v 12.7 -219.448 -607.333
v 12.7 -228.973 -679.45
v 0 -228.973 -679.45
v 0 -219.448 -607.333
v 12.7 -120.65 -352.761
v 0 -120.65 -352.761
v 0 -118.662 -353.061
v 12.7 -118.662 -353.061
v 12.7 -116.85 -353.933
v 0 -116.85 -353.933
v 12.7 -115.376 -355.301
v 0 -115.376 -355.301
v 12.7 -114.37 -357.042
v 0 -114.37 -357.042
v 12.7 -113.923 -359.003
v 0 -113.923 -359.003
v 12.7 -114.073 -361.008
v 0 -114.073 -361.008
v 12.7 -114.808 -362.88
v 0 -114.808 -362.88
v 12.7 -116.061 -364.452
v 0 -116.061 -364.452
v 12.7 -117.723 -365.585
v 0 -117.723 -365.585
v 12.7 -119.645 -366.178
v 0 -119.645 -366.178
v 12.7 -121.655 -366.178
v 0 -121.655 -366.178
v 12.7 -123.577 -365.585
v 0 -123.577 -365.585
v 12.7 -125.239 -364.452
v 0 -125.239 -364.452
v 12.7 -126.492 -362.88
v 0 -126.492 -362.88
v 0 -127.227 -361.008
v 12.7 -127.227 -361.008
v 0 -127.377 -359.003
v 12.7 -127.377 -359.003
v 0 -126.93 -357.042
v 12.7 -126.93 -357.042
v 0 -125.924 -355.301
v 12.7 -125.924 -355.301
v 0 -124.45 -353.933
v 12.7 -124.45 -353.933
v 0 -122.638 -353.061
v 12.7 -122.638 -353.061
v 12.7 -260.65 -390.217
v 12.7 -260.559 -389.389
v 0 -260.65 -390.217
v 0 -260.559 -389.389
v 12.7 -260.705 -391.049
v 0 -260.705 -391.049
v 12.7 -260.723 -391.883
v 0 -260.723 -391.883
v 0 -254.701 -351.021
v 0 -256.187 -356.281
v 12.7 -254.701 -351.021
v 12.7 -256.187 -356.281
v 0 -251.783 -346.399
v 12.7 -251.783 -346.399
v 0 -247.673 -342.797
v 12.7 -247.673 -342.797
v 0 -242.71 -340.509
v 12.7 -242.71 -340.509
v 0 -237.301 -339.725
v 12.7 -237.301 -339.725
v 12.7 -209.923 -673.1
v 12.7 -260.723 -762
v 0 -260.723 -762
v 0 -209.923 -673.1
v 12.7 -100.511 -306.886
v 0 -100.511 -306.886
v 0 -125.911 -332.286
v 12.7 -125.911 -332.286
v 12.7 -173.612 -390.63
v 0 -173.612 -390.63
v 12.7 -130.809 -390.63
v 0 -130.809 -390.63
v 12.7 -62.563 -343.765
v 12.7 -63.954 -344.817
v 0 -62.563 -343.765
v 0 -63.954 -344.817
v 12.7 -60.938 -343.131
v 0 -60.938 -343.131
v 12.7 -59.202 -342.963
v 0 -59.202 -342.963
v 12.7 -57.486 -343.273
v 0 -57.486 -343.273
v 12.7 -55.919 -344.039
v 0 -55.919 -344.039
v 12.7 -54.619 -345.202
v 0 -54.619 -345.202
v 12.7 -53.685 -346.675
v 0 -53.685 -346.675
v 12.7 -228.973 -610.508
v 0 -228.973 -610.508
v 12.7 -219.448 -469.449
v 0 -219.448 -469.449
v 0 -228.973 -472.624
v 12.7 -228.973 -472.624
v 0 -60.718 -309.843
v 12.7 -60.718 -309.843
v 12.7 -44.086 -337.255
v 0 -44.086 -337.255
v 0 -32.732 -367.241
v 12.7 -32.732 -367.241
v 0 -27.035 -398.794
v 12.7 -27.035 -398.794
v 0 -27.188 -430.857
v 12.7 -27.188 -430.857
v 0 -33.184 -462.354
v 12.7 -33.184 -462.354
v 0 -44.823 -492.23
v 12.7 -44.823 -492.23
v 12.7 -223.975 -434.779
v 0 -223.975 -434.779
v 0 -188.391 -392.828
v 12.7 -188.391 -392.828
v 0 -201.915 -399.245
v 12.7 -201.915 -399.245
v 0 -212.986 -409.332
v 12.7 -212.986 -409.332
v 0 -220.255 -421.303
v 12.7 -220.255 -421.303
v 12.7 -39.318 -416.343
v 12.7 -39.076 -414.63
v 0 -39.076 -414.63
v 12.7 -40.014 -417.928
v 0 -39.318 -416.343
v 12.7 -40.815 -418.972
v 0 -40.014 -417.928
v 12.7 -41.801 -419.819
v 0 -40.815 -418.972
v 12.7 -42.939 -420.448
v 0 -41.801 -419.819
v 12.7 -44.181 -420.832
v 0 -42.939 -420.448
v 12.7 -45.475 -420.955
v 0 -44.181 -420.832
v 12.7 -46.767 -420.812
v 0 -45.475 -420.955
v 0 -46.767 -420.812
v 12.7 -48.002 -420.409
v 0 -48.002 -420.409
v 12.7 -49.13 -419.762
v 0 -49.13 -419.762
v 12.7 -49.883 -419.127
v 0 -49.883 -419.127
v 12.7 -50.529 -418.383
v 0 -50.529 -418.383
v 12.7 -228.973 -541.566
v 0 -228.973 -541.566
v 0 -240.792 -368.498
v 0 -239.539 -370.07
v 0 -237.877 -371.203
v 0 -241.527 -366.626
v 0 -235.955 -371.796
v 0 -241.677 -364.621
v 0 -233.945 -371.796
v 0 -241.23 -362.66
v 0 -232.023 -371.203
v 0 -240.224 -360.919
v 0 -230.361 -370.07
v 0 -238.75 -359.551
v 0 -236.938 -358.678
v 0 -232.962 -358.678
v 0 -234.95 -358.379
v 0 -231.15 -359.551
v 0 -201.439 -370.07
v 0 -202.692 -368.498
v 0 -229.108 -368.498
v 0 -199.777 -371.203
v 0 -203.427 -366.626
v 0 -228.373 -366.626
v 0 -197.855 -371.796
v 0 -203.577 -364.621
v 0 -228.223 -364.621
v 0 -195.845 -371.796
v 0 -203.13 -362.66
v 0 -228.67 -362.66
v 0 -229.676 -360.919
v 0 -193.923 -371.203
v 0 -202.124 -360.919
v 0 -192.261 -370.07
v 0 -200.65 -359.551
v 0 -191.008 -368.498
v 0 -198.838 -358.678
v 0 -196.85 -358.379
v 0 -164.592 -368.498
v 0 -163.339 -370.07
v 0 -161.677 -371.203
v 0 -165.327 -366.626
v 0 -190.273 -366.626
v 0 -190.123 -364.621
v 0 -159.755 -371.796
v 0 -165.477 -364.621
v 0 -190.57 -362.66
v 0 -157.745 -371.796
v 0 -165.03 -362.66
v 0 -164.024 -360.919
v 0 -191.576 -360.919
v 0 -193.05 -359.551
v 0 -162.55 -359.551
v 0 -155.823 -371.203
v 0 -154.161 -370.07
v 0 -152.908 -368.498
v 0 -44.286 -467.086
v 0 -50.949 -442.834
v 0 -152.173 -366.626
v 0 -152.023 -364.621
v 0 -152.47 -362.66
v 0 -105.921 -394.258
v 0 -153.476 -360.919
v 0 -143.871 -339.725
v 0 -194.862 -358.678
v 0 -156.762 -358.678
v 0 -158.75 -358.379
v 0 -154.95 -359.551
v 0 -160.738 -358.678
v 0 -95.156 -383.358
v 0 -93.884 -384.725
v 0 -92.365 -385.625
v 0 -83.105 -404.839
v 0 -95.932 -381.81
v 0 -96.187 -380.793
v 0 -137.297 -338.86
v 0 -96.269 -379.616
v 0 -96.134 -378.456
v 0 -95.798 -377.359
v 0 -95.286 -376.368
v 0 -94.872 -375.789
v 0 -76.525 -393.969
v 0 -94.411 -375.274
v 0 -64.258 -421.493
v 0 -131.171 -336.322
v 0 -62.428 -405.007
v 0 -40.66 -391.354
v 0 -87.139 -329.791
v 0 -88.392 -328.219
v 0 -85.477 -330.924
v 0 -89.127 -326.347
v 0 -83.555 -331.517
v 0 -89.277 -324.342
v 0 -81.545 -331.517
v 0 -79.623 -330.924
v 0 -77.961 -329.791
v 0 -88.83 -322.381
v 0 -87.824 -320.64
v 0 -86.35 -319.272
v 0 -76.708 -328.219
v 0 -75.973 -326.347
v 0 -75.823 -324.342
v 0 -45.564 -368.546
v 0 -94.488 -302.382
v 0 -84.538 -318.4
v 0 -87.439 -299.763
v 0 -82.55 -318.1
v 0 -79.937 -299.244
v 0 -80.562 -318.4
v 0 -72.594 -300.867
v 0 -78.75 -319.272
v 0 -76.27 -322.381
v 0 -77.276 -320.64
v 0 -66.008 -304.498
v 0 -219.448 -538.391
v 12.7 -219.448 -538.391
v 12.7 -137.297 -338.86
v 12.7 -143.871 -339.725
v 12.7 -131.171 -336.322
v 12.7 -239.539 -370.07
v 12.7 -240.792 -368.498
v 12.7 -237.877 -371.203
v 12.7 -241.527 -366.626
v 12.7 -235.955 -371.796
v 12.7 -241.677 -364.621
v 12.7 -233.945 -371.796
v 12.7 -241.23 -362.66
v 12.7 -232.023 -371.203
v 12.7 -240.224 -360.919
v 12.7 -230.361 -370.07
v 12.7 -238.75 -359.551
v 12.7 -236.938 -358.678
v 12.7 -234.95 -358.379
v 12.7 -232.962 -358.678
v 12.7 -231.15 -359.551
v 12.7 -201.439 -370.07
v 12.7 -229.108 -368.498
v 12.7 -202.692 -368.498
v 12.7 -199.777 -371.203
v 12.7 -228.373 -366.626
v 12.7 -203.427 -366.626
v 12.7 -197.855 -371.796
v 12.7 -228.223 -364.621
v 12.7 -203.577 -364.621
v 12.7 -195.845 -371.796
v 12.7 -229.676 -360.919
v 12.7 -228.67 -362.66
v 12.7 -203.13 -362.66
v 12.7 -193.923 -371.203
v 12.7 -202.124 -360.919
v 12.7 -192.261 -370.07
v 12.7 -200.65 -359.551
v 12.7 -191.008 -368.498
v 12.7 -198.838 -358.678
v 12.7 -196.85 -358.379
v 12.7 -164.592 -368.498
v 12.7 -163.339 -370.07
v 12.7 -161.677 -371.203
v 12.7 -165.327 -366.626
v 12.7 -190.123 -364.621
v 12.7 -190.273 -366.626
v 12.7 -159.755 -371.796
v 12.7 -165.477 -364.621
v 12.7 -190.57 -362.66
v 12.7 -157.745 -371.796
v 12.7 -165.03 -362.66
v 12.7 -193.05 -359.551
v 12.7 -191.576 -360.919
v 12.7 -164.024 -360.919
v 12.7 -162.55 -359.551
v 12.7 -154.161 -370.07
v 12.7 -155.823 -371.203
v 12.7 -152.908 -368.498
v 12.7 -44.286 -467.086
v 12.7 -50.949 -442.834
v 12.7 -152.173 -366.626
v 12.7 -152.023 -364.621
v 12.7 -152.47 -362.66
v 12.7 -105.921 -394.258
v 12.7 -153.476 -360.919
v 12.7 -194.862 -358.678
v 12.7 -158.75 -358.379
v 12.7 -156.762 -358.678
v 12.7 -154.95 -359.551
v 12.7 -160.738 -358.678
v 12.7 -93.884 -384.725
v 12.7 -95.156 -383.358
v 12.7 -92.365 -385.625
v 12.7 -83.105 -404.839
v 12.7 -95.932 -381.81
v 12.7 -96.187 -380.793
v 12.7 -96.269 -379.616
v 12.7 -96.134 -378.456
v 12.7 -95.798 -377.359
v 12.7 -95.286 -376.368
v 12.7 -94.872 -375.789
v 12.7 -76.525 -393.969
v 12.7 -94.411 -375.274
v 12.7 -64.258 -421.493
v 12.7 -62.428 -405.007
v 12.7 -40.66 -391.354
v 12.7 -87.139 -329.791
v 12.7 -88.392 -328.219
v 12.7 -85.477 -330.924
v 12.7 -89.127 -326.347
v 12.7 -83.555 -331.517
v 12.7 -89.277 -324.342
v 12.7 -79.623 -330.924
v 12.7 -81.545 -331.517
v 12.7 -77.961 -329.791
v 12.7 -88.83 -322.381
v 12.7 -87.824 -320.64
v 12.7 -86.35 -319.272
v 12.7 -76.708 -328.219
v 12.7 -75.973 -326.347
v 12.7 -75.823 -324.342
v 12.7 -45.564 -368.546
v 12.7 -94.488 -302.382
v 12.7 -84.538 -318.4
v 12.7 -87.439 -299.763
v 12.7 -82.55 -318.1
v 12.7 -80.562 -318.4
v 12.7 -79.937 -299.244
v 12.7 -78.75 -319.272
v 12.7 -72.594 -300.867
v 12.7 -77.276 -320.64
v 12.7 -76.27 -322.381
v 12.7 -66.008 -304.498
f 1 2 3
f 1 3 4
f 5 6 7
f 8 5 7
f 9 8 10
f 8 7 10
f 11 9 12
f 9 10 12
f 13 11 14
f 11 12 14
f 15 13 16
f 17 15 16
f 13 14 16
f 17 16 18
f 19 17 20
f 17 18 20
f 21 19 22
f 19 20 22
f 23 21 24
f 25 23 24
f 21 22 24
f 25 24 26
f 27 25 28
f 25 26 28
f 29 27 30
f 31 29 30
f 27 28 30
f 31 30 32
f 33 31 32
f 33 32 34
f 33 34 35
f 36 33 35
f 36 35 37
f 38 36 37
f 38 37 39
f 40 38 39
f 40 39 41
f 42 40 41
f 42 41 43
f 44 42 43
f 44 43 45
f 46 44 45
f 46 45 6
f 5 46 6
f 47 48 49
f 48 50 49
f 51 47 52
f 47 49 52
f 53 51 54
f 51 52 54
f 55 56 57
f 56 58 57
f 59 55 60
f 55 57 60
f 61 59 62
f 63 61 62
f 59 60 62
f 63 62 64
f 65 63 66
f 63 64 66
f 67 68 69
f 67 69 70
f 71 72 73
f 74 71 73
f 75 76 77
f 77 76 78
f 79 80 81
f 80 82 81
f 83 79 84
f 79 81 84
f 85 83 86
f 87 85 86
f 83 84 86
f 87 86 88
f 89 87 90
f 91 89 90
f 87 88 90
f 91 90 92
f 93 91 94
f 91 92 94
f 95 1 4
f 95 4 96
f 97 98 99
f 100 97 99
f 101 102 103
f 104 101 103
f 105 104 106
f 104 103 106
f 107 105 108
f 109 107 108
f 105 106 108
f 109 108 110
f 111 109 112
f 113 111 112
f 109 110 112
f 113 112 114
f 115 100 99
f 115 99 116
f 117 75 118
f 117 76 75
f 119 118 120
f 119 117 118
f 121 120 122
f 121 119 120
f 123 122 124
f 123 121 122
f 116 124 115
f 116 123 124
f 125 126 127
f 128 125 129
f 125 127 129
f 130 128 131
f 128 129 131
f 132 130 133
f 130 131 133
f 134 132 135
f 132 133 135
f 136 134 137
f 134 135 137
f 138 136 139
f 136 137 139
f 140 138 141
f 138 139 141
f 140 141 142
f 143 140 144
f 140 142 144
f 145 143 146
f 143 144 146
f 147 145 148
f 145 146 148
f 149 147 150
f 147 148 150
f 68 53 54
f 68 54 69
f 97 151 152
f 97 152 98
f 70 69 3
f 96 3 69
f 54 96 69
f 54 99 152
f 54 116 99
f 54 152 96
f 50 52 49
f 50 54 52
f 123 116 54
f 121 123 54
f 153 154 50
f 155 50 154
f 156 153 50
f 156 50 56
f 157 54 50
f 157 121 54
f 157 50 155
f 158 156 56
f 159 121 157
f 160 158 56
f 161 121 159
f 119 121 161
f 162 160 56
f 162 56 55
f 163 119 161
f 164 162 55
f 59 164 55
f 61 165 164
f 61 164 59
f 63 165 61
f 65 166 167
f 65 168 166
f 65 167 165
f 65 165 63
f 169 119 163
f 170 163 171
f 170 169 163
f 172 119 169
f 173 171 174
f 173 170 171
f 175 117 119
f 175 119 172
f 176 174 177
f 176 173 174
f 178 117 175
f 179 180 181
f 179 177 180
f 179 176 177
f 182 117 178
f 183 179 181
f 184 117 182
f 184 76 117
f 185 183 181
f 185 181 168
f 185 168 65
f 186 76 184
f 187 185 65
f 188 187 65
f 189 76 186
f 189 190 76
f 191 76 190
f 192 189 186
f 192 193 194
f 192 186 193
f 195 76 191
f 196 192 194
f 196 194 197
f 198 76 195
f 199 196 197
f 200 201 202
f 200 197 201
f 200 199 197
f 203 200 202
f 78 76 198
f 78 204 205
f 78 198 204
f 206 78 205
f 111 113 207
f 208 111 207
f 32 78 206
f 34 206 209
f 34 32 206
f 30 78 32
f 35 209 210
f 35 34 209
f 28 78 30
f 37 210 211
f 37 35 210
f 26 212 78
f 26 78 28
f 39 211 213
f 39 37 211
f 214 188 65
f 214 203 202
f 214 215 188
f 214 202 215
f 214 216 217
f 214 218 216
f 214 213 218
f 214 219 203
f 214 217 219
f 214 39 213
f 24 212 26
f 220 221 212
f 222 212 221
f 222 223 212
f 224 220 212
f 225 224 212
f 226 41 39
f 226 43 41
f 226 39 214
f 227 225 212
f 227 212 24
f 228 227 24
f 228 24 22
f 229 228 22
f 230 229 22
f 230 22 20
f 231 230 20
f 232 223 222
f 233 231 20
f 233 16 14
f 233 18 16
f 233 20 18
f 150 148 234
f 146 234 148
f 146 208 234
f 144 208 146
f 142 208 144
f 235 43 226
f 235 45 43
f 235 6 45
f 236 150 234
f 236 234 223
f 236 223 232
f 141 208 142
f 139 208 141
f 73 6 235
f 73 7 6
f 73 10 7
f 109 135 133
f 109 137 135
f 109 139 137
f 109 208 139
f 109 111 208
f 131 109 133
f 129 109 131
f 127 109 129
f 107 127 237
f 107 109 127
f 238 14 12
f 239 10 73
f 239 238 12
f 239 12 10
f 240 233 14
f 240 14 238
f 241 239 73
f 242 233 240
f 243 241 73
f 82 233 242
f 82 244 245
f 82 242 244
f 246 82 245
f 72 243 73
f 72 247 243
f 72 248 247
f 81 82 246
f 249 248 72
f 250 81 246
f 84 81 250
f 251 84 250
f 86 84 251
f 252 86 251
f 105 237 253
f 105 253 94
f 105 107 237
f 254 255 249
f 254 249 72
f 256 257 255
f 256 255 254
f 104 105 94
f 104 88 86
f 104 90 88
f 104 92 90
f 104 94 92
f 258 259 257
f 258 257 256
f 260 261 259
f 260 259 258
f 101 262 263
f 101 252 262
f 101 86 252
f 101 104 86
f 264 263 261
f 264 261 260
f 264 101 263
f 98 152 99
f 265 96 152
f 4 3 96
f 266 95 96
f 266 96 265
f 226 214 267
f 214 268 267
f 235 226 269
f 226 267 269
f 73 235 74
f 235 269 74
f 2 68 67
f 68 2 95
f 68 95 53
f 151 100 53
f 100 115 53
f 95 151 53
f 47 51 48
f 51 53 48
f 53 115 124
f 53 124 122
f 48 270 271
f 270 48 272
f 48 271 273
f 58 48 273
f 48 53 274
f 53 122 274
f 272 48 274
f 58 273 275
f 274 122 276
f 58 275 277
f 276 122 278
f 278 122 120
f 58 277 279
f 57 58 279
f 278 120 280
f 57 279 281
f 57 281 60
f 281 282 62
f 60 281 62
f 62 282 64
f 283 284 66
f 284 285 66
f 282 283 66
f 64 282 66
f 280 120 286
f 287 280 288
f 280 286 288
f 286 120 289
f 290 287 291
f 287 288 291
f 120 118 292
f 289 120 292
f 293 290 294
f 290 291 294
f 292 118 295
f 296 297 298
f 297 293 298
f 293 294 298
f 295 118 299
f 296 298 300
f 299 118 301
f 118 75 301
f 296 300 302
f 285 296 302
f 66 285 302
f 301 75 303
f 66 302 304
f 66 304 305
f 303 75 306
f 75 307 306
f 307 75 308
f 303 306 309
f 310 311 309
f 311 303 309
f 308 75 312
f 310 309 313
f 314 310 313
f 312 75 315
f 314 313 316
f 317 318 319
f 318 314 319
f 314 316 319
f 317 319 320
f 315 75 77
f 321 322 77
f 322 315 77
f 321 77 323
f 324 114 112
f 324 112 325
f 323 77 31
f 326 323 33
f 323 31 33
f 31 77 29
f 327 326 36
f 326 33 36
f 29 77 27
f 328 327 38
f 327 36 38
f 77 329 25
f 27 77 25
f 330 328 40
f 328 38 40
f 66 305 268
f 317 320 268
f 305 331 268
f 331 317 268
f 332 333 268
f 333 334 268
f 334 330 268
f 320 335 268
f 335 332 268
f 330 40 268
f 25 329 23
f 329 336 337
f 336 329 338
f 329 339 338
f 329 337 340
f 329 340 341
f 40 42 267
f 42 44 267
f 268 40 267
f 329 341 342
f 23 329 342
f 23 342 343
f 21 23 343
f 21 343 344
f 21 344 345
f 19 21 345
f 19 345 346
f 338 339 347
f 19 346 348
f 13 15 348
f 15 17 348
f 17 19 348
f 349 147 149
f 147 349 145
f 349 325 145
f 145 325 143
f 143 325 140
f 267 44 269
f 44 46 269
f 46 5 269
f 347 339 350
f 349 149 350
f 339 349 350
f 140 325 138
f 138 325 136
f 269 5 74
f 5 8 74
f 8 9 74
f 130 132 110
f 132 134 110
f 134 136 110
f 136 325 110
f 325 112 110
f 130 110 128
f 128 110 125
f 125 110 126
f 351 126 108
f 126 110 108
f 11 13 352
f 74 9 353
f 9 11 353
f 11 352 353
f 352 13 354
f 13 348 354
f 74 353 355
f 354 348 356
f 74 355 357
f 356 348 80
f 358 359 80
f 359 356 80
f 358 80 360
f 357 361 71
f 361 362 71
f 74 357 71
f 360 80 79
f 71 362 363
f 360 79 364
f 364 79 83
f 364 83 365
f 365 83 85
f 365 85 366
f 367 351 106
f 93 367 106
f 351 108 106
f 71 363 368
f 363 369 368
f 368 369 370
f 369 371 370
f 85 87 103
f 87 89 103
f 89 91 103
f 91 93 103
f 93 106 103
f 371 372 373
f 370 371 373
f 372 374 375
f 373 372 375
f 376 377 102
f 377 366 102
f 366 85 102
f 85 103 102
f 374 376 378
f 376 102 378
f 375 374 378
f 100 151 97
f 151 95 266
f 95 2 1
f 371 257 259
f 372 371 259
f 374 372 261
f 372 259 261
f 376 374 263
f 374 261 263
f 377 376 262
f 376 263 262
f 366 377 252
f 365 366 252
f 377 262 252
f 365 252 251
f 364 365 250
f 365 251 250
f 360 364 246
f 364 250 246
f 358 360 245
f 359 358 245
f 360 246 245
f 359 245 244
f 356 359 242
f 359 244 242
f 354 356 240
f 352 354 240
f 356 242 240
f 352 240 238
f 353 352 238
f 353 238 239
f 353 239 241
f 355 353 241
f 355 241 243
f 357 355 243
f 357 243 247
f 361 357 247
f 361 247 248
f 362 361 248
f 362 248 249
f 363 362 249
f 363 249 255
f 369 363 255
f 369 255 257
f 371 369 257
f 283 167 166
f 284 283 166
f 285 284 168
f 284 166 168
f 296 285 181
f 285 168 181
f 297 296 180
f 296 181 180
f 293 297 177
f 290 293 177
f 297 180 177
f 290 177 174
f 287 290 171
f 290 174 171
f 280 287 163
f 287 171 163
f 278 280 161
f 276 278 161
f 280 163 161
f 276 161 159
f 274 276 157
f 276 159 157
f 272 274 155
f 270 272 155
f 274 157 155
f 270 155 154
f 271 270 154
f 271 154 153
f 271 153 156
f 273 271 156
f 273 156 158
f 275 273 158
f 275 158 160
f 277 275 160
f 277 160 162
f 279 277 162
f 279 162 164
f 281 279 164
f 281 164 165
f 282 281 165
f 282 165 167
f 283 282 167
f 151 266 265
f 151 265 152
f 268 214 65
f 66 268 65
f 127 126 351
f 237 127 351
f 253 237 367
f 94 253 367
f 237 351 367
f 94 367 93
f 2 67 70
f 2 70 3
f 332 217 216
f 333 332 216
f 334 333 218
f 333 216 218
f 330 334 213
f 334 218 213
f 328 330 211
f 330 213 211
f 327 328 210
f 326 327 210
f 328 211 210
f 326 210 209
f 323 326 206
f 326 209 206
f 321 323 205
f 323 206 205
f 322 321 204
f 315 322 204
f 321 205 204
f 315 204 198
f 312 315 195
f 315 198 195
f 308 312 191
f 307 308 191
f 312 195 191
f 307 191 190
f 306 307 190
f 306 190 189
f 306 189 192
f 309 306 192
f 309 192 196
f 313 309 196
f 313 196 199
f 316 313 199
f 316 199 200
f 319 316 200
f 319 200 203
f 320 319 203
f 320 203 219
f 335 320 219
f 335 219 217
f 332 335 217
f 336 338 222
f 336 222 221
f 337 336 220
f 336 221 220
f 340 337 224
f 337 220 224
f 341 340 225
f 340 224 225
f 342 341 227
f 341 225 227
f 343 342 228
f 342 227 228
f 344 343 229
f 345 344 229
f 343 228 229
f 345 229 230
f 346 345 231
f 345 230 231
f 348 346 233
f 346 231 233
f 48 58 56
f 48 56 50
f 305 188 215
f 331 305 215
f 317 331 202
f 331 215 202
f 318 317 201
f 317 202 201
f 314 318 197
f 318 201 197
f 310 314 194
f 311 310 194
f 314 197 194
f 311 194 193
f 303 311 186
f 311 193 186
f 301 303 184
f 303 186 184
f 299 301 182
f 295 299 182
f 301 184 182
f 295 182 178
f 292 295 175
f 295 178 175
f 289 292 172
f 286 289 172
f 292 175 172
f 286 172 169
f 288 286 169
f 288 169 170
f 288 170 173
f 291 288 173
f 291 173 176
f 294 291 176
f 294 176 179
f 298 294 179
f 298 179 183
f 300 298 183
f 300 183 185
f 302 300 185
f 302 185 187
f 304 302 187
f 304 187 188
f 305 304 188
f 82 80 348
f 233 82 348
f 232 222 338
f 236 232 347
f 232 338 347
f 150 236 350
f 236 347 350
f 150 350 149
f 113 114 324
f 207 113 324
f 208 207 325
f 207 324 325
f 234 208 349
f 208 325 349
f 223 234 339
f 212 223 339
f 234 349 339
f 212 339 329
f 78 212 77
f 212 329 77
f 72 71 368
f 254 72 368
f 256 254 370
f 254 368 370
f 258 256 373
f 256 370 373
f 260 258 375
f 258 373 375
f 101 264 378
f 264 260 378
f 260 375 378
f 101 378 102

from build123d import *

# Parameters (mm, degrees)
SKETCH1_R                   = 19.05
BOSS_EXTRUDE1_DEPTH         = 12.7
FILLET1_R                   = 25.4
FILLET2_R                   = 50.8
F_1_2_CLEARANCE_HOLE1_D     = 13.49248
F_1_2_CLEARANCE_HOLE1_DEPTH = 38.1
F_1_2_CLEARANCE_HOLE1_TIP   = 4.053549943
SKETCH4_R                   = 19.05
CUT_EXTRUDE1_DEPTH          = 13.7
BOSS_EXTRUDE2_DEPTH         = 12.7
FILLET3_R                   = 19.05
FILLET4_R                   = 50.8
BOSS_EXTRUDE3_DEPTH         = 12.7
CUT_EXTRUDE2_DEPTH          = 13.7
FILLET7_R                   = 6.35


with BuildPart() as part:
    # Sketch1 → Boss-Extrude1 (new body)
    with BuildSketch(Plane(origin=(0, 0, 0), x_dir=(0, 0, -1), z_dir=(1, 0, 0))):
        with BuildLine():
            Line((390.630407277, -109.766978243), (305.29908743, -24.435658396))
            Line((305.29908743, -24.435658396), (12.395871839, 49.264412727))
            ThreePointArc((12.395871839, 49.264412727), (-49.470959365, 11.544010545), (-10.688712274, -49.662777107))
            Line((-10.688712274, -49.662777107), (281.610658396, -75.235658396))
            Line((281.610658396, -75.235658396), (339.725, -133.35))
            Line((339.725, -133.35), (339.725, -254))
            Line((339.725, -254), (390.630407277, -254))
            Line((390.630407277, -254), (390.630407277, -109.766978243))
        make_face()
        Circle(SKETCH1_R, mode=Mode.SUBTRACT)
    extrude(amount=BOSS_EXTRUDE1_DEPTH)

    # Fillet1
    fillet1_edges = [part.edges().sort_by_distance(p)[0] for p in [
        (6.35, -133.35, -339.725),
        (6.35, -75.235658396, -281.610658396),
    ]]
    fillet(fillet1_edges, radius=FILLET1_R)

    # Fillet2
    fillet2_edges = [part.edges().sort_by_distance(p)[0] for p in [
        (6.35, -24.435658396, -305.29908743),
        (6.35, -109.766978243, -390.630407277),
    ]]
    fillet(fillet2_edges, radius=FILLET2_R)

    # 1/2 Clearance Hole1
    with Locations(Plane(origin=(12.7, 0, 0), x_dir=(0, 0, -1), z_dir=(1, 0, 0))):
        with Locations((365.125, -234.95), (365.125, -196.85), (365.125, -158.75), (359.5071206, -120.65), (324.846024484, -82.55)):
            Hole(F_1_2_CLEARANCE_HOLE1_D / 2, depth=F_1_2_CLEARANCE_HOLE1_DEPTH)
            with Locations((0, 0, -(F_1_2_CLEARANCE_HOLE1_DEPTH + F_1_2_CLEARANCE_HOLE1_TIP / 2))):  # 118° drill point
                Cone(0, F_1_2_CLEARANCE_HOLE1_D / 2, F_1_2_CLEARANCE_HOLE1_TIP, mode=Mode.SUBTRACT)

    # Sketch4 → Cut-Extrude1 (cut, through all)
    with BuildSketch(Plane(origin=(12.7, 0, 0), x_dir=(0, 0, -1), z_dir=(1, 0, 0))):
        with BuildLine():
            Line((288.147750244, -81.772750244), (306.885512242, -100.510512242))
            ThreePointArc((306.885512242, -100.510512242), (306.885512242, -63.266297725), (344.129726759, -63.266297725))
            Line((344.129726759, -63.266297725), (315.219181895, -34.355752861))
            ThreePointArc((315.219181895, -34.355752861), (304.360921026, -26.089699144), (291.69402925, -21.012364618))
            Line((291.69402925, -21.012364618), (12.395871839, 49.264412727))
            ThreePointArc((12.395871839, 49.264412727), (-49.470959365, 11.544010545), (-10.688712274, -49.662777107))
            Line((-10.688712274, -49.662777107), (272.400993868, -74.429917155))
            ThreePointArc((272.400993868, -74.429917155), (280.92174185, -76.713044696), (288.147750244, -81.772750244))
        make_face()
        Circle(SKETCH4_R, mode=Mode.SUBTRACT)
    extrude(amount=-CUT_EXTRUDE1_DEPTH, mode=Mode.SUBTRACT)

    # Sketch5 → Boss-Extrude2 (add)
    with BuildSketch(Plane(origin=(12.7, 0, 0), x_dir=(0, 0, -1), z_dir=(1, 0, 0))):
        Polygon((339.725, -254), (390.630407277, -260.723431786), (762, -260.723431786), (673.1, -209.923431786), (679.45, -228.973431786), (607.332959214, -219.448431786), (610.507959214, -228.973431786), (538.390918427, -219.448431786), (541.565918427, -228.973431786), (469.448877641, -219.448431786), (472.623877641, -228.973431786), (400.506836855, -219.448431786), (390.630407277, -218.143982925), (390.630407277, -254), align=None)
    extrude(amount=-BOSS_EXTRUDE2_DEPTH)

    # Fillet3
    fillet3_edges = [part.edges().sort_by_distance(p)[0] for p in [
        (6.35, -260.723431786, -390.630407277),
        (6.35, -254, -339.725),
    ]]
    fillet(fillet3_edges, radius=FILLET3_R)

    # Fillet4
    fillet4_edges = [part.edges().sort_by_distance(p)[0] for p in [
        (6.35, -218.143982925, -390.630407277),
    ]]
    fillet(fillet4_edges, radius=FILLET4_R)

    # Sketch6 → Boss-Extrude3 (add)
    with BuildSketch(Plane(origin=(12.7, 0, 0), x_dir=(0, 0, -1), z_dir=(1, 0, 0))):
        with BuildLine():
            Line((375.751431761, -94.888002727), (344.129726759, -63.266297725))
            Line((344.129726759, -63.266297725), (309.842868861, -60.718111058))
            ThreePointArc((309.842868861, -60.718111058), (398.793863401, -27.03548328), (492.230407277, -44.823431786))
            ThreePointArc((492.230407277, -44.823431786), (421.492844328, -64.2581395), (390.630407277, -130.809027211))
            Line((390.630407277, -130.809027211), (375.751431761, -94.888002727))
        make_face()
    extrude(amount=-BOSS_EXTRUDE3_DEPTH)

    # Sketch7 → Cut-Extrude2 (cut, through all)
    with BuildSketch(Plane(origin=(12.7, 0, 0), x_dir=(0, 0, -1), z_dir=(1, 0, 0))):
        with BuildLine():
            Line((338.534408325, -57.67097929), (375.751431761, -94.888002727))
            ThreePointArc((375.751431761, -94.888002727), (379.072218132, -98.54883067), (382.021527149, -102.515045449))
            ThreePointArc((382.021527149, -102.515045449), (401.979554881, -65.801657117), (435.210476685, -40.465880242))
            ThreePointArc((435.210476685, -40.465880242), (385.540929372, -41.58660974), (338.534408325, -57.67097929))
        make_face()
    extrude(amount=-CUT_EXTRUDE2_DEPTH, mode=Mode.SUBTRACT)

    # Fillet7
    fillet7_edges = [part.edges().sort_by_distance(p)[0] for p in [
        (6.35, -102.515045449, -382.021527149),
        (6.35, -40.465880242, -435.210476685),
        (6.35, -57.67097929, -338.534408325),
    ]]
    fillet(fillet7_edges, radius=FILLET7_R)


solid = part.part
